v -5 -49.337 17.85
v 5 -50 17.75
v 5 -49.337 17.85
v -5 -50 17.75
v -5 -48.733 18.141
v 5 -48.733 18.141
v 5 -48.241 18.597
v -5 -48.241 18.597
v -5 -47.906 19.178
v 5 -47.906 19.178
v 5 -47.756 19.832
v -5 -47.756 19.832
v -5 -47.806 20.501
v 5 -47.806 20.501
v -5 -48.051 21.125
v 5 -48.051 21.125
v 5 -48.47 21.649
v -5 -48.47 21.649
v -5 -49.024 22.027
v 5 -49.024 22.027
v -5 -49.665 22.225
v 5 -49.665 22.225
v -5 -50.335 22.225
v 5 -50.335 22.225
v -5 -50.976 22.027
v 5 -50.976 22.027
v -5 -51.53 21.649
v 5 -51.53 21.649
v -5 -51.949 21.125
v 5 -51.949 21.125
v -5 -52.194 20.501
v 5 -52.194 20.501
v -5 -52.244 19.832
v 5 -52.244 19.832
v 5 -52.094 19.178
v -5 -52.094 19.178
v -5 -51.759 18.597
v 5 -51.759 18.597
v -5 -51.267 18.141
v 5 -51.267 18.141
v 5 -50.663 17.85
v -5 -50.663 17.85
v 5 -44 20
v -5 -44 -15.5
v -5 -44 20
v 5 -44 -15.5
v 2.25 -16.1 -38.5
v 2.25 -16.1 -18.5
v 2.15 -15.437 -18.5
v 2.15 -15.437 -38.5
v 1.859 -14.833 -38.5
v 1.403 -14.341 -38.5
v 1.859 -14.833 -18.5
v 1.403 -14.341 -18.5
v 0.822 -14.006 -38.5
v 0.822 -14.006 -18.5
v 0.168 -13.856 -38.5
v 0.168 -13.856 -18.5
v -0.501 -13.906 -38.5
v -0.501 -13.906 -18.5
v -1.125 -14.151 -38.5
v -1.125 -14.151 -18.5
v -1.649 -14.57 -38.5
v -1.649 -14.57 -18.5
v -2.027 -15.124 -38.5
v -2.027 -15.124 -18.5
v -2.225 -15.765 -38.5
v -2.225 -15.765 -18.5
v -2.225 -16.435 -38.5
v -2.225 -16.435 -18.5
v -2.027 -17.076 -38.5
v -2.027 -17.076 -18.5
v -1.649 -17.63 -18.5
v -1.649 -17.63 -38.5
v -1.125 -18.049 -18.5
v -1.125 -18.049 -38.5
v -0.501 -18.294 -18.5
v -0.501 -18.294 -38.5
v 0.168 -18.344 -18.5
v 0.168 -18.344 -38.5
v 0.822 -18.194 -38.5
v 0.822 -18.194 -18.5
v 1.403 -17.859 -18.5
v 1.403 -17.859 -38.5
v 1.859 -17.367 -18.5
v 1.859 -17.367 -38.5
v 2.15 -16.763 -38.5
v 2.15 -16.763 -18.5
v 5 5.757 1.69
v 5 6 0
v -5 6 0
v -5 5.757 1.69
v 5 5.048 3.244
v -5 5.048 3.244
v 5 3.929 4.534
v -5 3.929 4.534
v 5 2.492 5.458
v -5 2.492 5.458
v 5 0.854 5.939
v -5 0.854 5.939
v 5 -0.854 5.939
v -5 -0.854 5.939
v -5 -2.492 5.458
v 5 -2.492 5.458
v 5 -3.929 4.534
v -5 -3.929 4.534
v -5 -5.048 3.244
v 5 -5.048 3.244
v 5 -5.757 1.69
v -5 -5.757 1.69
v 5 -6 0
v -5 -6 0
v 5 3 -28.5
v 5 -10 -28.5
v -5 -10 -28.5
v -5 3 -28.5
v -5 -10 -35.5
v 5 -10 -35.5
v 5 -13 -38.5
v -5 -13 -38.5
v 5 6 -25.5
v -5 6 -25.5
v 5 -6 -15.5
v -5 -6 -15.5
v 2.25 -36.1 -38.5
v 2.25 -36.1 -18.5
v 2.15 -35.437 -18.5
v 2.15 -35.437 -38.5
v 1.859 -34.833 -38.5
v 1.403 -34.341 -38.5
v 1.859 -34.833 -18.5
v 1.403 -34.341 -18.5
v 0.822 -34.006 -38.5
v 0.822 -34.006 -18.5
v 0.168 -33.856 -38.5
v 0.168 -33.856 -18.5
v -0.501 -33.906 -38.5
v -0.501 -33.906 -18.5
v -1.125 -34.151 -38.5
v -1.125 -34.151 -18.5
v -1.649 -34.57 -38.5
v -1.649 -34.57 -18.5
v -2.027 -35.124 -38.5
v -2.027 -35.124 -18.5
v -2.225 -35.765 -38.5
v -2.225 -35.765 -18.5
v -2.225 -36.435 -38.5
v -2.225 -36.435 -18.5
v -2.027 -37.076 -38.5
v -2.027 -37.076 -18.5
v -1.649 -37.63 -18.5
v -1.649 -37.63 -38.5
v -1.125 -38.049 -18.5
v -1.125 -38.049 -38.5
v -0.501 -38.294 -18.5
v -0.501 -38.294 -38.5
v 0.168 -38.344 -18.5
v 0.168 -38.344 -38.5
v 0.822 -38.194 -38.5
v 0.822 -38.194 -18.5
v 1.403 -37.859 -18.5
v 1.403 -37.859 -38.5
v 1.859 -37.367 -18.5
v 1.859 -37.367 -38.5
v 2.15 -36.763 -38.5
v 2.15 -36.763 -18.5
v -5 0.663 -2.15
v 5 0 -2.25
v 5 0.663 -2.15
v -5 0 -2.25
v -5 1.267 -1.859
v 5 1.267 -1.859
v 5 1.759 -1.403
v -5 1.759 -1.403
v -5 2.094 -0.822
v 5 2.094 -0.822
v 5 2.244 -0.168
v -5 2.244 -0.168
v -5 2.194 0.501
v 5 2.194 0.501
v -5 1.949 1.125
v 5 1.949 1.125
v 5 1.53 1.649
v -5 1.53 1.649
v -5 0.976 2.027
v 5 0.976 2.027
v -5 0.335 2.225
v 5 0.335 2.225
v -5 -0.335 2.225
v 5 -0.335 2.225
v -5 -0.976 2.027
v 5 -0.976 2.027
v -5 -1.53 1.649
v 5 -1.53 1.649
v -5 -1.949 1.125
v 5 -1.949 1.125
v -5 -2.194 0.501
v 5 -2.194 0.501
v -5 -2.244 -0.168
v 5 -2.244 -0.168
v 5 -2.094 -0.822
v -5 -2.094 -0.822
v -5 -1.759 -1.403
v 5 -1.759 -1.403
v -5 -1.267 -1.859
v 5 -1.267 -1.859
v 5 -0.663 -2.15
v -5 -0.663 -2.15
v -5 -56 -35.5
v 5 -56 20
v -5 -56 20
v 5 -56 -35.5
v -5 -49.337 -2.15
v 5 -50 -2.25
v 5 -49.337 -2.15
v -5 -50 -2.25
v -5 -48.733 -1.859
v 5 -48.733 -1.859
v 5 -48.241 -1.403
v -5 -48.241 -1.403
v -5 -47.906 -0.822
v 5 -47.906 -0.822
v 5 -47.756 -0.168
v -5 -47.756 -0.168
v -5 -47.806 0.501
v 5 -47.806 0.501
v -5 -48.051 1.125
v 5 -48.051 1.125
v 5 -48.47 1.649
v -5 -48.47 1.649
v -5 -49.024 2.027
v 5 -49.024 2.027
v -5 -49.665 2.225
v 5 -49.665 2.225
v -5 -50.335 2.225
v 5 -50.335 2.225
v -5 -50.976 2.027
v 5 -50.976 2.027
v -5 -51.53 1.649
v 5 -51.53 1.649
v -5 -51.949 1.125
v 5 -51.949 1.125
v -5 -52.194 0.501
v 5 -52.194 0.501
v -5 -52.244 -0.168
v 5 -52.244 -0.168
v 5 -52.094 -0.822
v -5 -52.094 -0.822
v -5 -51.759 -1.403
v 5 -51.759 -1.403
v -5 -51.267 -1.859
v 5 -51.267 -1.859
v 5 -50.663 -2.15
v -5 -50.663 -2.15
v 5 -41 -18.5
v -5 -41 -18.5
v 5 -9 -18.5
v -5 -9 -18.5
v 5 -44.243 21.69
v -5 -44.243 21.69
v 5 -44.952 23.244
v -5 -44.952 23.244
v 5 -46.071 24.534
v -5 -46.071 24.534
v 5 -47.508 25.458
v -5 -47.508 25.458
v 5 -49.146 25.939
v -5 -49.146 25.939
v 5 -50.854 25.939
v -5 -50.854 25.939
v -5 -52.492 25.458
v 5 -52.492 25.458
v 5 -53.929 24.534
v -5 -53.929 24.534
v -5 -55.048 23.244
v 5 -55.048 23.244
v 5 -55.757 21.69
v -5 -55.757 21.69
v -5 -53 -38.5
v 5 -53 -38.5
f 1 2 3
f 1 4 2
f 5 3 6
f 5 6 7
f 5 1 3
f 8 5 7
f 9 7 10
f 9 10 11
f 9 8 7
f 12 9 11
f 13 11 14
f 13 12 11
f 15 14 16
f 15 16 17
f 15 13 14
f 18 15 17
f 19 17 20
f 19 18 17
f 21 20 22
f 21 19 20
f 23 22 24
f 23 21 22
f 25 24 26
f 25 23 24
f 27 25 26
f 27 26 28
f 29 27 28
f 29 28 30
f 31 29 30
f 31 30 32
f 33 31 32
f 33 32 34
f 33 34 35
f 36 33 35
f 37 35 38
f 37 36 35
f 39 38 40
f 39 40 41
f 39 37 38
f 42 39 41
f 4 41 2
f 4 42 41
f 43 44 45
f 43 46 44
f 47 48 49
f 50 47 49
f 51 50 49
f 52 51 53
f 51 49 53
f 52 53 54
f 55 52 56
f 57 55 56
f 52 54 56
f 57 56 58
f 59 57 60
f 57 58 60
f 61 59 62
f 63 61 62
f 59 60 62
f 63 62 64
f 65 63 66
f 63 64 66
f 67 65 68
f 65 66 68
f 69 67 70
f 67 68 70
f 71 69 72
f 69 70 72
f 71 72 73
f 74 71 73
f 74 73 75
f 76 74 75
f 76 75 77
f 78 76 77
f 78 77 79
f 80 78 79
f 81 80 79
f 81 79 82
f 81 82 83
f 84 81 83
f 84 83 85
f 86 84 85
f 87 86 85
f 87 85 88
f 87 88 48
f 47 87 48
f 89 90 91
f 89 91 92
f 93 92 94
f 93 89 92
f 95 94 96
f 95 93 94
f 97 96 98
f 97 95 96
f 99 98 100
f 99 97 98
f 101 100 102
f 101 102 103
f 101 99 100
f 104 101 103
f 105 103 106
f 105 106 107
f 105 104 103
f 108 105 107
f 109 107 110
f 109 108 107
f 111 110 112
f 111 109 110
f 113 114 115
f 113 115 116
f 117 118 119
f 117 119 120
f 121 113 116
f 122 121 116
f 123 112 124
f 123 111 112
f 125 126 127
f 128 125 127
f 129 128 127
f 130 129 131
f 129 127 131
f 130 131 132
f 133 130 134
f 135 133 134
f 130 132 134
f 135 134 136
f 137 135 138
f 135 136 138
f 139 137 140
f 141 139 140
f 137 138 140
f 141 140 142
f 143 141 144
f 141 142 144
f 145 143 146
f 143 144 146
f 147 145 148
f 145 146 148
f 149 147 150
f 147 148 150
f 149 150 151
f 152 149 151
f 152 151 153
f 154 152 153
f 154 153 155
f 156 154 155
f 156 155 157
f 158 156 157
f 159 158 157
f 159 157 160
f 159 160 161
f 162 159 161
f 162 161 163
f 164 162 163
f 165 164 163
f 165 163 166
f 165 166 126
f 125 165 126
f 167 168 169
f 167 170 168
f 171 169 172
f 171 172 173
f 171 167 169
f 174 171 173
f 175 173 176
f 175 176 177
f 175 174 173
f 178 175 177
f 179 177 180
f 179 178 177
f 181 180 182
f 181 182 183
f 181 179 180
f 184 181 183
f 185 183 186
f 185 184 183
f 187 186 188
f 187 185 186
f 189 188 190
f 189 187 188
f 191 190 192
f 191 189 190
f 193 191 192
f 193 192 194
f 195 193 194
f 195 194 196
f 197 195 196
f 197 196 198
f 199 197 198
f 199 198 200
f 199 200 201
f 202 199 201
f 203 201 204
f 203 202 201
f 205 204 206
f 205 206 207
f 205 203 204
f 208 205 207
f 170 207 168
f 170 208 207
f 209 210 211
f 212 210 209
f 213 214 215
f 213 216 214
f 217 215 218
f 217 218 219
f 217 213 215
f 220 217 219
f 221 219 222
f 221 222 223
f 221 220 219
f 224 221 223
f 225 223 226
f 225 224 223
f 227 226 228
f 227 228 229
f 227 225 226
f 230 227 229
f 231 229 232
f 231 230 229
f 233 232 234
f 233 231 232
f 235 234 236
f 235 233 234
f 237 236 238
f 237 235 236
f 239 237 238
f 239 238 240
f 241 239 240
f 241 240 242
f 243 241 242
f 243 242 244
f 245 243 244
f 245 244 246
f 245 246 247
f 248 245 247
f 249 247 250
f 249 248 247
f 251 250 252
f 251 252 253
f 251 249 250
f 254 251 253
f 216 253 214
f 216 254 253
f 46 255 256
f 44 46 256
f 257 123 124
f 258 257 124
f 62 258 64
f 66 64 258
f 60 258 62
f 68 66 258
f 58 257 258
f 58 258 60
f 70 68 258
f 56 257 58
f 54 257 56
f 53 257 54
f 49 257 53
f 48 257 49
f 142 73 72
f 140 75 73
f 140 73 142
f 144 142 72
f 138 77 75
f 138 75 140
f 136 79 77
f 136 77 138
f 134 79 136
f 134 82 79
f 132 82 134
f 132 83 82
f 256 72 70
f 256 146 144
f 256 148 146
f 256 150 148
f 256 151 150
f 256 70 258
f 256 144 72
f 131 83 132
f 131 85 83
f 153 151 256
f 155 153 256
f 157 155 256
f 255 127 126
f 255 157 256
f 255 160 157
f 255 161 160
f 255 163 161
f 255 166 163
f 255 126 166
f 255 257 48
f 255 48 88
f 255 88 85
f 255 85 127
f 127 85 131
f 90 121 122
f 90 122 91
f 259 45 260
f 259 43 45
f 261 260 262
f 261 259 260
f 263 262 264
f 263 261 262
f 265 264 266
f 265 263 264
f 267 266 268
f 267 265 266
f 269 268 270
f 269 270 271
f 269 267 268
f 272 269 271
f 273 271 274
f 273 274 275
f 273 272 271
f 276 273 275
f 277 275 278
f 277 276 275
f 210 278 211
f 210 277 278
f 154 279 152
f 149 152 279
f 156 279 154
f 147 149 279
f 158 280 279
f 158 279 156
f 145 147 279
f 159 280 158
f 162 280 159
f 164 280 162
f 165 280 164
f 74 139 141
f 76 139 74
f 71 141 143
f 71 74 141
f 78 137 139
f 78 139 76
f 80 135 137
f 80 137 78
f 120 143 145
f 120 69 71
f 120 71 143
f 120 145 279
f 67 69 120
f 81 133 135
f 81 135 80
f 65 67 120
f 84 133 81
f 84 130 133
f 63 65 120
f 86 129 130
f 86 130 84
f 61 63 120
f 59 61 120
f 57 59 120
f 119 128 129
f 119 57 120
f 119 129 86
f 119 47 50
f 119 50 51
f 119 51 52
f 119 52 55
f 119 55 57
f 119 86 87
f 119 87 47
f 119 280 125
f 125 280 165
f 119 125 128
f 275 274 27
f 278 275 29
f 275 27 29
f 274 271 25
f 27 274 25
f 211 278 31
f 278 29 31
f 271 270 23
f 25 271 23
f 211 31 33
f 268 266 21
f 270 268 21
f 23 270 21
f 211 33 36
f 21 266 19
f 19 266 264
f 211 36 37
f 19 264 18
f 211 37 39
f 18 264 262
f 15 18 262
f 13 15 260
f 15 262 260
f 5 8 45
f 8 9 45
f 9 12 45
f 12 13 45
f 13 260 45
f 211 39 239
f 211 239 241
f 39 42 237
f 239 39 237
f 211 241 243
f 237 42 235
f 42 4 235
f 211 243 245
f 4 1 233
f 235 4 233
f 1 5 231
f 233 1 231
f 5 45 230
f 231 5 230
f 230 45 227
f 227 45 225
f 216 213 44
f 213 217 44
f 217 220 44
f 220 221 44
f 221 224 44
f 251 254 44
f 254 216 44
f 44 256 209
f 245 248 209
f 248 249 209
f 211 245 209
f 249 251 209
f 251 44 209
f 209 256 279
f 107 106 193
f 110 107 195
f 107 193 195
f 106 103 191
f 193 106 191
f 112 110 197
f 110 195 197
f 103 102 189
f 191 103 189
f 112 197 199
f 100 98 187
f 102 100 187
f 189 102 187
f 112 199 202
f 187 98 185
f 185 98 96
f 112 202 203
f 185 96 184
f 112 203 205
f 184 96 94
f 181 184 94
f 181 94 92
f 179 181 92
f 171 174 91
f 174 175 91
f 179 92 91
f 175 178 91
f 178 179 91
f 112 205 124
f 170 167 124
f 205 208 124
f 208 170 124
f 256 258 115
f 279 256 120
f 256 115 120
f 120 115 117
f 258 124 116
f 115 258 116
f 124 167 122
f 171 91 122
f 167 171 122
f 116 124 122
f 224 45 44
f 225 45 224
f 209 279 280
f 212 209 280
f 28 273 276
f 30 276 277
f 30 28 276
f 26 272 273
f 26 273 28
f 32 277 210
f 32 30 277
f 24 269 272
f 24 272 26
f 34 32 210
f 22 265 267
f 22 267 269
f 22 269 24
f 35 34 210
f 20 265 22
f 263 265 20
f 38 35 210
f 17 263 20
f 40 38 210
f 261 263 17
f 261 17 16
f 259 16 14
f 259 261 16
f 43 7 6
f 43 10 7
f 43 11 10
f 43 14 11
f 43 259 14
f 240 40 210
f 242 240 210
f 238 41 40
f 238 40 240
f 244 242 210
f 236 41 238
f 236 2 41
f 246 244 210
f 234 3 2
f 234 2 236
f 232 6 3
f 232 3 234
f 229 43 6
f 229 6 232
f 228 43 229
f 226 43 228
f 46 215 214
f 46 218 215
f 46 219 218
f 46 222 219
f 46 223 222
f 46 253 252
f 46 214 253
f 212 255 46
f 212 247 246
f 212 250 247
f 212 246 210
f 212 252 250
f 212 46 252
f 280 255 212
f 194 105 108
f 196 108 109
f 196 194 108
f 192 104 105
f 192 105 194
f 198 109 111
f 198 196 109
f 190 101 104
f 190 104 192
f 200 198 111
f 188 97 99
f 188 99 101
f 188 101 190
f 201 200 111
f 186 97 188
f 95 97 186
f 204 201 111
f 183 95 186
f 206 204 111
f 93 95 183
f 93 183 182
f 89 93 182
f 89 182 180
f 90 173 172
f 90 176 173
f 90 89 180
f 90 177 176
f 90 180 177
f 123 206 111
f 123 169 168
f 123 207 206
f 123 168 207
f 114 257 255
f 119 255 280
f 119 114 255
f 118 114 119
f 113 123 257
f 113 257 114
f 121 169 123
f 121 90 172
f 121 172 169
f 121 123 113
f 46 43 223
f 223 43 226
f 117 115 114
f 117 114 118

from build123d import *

# Parameters (mm, degrees)
SKETCH1_R           = 2.25
BOSS_EXTRUDE1_DEPTH = 5
SKETCH2_R           = 2.25
CUT_EXTRUDE1_DEPTH  = 72.702510416
SKETCH3_W           = 10
SKETCH3_H           = 16
CUT_EXTRUDE2_DEPTH  = 69.689518851
CHAMFER1_SIZE       = 3


with BuildPart() as part:
    # Sketch1 → Boss-Extrude1 (new, symmetric)
    with BuildSketch(Plane(origin=(0, 0, 0), x_dir=(0, 0, -1), z_dir=(1, 0, 0))):
        with BuildLine():
            Line((-20, -56), (38.5, -56))
            Line((38.5, -56), (38.5, 6))
            Line((38.5, 6), (0, 6))
            ThreePointArc((0, 6), (-6, 0), (0, -6))
            Line((0, -6), (18.5, -6))
            Line((18.5, -6), (18.5, -44))
            Line((18.5, -44), (-20, -44))
            ThreePointArc((-20, -44), (-26, -50), (-20, -56))
        make_face()
        Circle(SKETCH1_R, mode=Mode.SUBTRACT)
        with Locations((0, -50)):
            Circle(SKETCH1_R, mode=Mode.SUBTRACT)
        with Locations((-20, -50)):
            Circle(SKETCH1_R, mode=Mode.SUBTRACT)
    extrude(amount=BOSS_EXTRUDE1_DEPTH, both=True)

    # Sketch2 → Cut-Extrude1 (cut, through all)
    with BuildSketch(Plane.XY.offset(-18.5)):
        with Locations((0, -16.1)):
            Circle(SKETCH2_R)
        with Locations((0, -36.1)):
            Circle(SKETCH2_R)
    extrude(amount=-CUT_EXTRUDE1_DEPTH, mode=Mode.SUBTRACT)

    # Sketch3 → Cut-Extrude2 (cut, through all)
    with BuildSketch(Plane(origin=(5, 0, 0), x_dir=(0, 0, -1), z_dir=(1, 0, 0))):
        with Locations((33.5, -2)):
            Rectangle(SKETCH3_W, SKETCH3_H)
    extrude(amount=-CUT_EXTRUDE2_DEPTH, mode=Mode.SUBTRACT)

    # Chamfer1
    chamfer1_edges = [part.edges().sort_by_distance(p)[0] for p in [
        (0, -44, -18.5),
        (0, -6, -18.5),
        (0, -56, -38.5),
        (0, -10, -38.5),
        (0, 6, -28.5),
    ]]
    chamfer(chamfer1_edges, length=CHAMFER1_SIZE)


solid = part.part
